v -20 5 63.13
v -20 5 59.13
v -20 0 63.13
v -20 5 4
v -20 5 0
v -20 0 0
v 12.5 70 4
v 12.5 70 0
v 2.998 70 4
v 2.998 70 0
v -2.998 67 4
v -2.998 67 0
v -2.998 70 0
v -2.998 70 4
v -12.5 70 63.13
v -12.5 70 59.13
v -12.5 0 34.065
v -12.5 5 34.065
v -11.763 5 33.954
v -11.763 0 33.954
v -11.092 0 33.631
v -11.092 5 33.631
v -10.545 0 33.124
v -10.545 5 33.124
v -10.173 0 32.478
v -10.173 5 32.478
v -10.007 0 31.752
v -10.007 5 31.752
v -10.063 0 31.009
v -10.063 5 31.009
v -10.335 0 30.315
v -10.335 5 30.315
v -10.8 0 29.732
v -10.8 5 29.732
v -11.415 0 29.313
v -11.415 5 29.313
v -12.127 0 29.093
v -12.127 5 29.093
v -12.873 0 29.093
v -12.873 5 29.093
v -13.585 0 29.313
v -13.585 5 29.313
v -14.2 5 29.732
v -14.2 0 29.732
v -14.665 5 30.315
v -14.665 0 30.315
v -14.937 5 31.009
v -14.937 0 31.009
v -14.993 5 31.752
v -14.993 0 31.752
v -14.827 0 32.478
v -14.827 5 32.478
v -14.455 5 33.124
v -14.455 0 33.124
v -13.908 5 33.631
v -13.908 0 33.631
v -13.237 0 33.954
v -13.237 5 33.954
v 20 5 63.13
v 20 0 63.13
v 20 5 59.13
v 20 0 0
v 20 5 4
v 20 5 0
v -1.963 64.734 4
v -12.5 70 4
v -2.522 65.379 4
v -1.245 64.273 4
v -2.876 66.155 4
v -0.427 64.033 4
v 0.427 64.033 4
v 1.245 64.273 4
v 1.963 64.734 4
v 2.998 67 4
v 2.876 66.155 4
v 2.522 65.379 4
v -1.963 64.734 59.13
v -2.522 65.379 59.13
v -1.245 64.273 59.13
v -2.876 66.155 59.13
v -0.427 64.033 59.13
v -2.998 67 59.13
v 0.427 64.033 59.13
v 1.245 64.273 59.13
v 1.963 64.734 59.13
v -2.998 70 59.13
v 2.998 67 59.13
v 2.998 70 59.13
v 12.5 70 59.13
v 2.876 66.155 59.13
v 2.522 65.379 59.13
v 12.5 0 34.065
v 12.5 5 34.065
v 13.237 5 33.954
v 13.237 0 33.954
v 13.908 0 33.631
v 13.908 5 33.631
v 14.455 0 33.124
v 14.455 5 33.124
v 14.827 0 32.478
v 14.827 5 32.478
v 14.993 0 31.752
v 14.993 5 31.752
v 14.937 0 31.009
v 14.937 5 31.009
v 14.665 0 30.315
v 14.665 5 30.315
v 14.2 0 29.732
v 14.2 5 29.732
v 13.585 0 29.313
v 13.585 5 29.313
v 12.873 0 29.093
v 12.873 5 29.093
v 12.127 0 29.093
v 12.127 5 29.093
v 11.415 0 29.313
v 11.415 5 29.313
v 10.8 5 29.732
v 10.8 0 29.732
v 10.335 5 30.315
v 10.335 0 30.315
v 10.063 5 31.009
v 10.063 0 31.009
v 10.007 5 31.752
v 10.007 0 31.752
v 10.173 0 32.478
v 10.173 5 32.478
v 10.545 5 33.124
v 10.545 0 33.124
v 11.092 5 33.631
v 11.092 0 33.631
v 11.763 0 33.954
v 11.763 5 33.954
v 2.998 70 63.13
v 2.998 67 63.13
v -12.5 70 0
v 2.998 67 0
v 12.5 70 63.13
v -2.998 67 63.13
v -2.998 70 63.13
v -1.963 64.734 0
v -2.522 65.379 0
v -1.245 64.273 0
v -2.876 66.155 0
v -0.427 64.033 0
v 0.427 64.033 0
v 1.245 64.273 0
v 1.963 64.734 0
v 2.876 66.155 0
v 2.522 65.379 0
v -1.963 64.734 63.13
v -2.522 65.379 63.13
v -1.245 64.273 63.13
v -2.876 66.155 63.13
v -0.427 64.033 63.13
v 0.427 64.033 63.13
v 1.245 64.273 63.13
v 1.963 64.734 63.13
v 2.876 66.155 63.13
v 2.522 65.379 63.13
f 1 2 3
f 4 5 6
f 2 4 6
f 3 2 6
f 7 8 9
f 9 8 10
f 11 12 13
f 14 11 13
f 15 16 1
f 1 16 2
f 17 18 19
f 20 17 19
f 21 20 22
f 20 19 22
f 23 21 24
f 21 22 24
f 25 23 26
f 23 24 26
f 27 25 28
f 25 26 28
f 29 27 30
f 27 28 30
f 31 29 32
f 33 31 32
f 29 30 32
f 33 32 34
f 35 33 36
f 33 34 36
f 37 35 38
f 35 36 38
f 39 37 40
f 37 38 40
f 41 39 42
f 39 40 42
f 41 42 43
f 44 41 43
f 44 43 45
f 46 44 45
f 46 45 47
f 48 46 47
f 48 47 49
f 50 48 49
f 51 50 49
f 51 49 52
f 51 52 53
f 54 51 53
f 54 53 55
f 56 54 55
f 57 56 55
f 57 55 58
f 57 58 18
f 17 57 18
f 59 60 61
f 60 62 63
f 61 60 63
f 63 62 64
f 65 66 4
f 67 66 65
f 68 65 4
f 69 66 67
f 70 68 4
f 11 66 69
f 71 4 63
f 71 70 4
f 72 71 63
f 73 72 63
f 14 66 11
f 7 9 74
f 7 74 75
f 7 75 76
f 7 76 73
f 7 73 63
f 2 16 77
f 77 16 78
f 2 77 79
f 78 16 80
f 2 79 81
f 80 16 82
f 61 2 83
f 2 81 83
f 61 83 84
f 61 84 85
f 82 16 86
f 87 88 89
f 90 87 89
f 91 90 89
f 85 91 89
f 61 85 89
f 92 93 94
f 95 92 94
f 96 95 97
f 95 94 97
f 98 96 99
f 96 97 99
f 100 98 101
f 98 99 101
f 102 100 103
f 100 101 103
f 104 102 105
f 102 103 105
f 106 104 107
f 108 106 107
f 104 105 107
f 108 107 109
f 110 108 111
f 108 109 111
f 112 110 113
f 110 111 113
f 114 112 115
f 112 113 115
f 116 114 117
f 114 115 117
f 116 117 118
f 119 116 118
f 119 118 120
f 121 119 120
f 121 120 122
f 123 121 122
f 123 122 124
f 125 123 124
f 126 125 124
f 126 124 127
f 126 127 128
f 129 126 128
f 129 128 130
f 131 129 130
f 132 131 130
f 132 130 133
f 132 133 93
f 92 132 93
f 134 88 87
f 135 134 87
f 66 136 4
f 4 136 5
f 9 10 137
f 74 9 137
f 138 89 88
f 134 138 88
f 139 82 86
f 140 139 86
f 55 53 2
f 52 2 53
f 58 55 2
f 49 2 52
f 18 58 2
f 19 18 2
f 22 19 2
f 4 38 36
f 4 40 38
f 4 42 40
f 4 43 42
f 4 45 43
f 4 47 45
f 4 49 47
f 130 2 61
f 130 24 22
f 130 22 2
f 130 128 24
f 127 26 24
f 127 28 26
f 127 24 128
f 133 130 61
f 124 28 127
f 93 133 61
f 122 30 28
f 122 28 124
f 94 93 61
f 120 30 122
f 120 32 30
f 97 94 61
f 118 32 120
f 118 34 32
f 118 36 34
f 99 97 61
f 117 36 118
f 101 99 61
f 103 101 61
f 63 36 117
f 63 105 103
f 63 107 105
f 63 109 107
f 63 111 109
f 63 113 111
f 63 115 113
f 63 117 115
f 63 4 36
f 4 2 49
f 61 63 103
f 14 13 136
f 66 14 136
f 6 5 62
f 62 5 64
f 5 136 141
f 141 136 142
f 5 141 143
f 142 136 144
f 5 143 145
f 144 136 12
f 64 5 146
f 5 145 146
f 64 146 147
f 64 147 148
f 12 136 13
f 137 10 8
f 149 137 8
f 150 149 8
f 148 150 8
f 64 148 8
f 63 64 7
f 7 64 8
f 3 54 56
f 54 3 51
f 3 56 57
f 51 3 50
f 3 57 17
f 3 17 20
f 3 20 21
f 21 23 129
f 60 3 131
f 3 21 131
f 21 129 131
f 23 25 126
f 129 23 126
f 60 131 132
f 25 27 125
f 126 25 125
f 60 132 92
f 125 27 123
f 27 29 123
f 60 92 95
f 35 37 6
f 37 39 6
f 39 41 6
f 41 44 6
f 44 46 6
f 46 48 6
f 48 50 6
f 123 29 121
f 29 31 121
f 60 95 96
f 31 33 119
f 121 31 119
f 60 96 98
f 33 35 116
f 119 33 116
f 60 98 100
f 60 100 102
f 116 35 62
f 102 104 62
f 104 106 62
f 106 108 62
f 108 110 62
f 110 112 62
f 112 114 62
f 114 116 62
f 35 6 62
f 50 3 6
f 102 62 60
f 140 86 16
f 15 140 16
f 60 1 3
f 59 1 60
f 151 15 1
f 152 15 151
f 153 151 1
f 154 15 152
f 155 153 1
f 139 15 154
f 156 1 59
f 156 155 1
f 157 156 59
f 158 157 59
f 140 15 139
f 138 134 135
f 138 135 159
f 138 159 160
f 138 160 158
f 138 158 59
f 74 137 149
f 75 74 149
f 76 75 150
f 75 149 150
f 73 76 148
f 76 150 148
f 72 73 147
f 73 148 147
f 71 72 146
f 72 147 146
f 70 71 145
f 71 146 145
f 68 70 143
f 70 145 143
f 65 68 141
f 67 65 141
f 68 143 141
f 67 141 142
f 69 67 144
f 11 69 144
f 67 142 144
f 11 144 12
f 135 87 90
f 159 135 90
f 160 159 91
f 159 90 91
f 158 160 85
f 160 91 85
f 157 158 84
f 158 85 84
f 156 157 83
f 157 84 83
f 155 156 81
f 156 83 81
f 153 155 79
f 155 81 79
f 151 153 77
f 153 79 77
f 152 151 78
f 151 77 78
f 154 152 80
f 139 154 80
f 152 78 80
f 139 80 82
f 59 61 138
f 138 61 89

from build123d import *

# Parameters (mm, degrees)
ESTRUSIONE_ESTRUSIONE1_DEPTH = 4
SCHIZZO2_W                   = 40
SCHIZZO2_H                   = 5
ESTRUSIONE_ESTRUSIONE2_DEPTH = 55.13
ESTRUSIONE_ESTRUSIONE3_DEPTH = 4
SCHIZZO4_R                   = 2.5
TAGLIO_ESTRUSIONE1_DEPTH     = 93.792224351


with BuildPart() as part:
    # Schizzo1 → Estrusione-Estrusione1 (new body)
    with BuildSketch(Plane.XY):
        with BuildLine():
            Line((-20, 0), (20, 0))
            Line((20, 0), (20, 5))
            Line((20, 5), (12.5, 70))
            Line((12.5, 70), (2.997785692, 70))
            Line((2.997785692, 70), (2.997785692, 67))
            ThreePointArc((2.997785692, 67), (0, 64.002214308), (-2.997785692, 67))
            Line((-2.997785692, 67), (-2.997785692, 70))
            Line((-2.997785692, 70), (-12.5, 70))
            Line((-12.5, 70), (-20, 5))
            Line((-20, 5), (-20, 0))
        make_face()
    extrude(amount=ESTRUSIONE_ESTRUSIONE1_DEPTH)

    # Schizzo2 → Estrusione-Estrusione2 (add)
    with BuildSketch(Plane.XY.offset(4)):
        with Locations((0, 2.5)):
            Rectangle(SCHIZZO2_W, SCHIZZO2_H)
    extrude(amount=ESTRUSIONE_ESTRUSIONE2_DEPTH)

    # Schizzo3 → Estrusione-Estrusione3 (add)
    with BuildSketch(Plane.XY.offset(59.13)):
        with BuildLine():
            Line((20, 5), (12.5, 70))
            Line((12.5, 70), (2.997785692, 70))
            Line((2.997785692, 70), (2.997785692, 67))
            ThreePointArc((2.997785692, 67), (0, 64.002214308), (-2.997785692, 67))
            Line((-2.997785692, 67), (-2.997785692, 70))
            Line((-2.997785692, 70), (-12.5, 70))
            Line((-12.5, 70), (-20, 5))
            Line((-20, 5), (-20, 0))
            Line((-20, 0), (20, 0))
            Line((20, 0), (20, 5))
        make_face()
    extrude(amount=ESTRUSIONE_ESTRUSIONE3_DEPTH)

    # Schizzo4 → Taglio-Estrusione1 (cut, through all)
    with BuildSketch(Plane(origin=(0, 5, 0), x_dir=(1, 0, 0), z_dir=(0, 1, 0))):
        with Locations(Location((12.5, -31.565, 0), (0, 0, 270))):
            Circle(SCHIZZO4_R)
        with Locations(Location((-12.5, -31.565, 0), (0, 0, 270))):
            Circle(SCHIZZO4_R)
    extrude(amount=-TAGLIO_ESTRUSIONE1_DEPTH, mode=Mode.SUBTRACT)


solid = part.part
